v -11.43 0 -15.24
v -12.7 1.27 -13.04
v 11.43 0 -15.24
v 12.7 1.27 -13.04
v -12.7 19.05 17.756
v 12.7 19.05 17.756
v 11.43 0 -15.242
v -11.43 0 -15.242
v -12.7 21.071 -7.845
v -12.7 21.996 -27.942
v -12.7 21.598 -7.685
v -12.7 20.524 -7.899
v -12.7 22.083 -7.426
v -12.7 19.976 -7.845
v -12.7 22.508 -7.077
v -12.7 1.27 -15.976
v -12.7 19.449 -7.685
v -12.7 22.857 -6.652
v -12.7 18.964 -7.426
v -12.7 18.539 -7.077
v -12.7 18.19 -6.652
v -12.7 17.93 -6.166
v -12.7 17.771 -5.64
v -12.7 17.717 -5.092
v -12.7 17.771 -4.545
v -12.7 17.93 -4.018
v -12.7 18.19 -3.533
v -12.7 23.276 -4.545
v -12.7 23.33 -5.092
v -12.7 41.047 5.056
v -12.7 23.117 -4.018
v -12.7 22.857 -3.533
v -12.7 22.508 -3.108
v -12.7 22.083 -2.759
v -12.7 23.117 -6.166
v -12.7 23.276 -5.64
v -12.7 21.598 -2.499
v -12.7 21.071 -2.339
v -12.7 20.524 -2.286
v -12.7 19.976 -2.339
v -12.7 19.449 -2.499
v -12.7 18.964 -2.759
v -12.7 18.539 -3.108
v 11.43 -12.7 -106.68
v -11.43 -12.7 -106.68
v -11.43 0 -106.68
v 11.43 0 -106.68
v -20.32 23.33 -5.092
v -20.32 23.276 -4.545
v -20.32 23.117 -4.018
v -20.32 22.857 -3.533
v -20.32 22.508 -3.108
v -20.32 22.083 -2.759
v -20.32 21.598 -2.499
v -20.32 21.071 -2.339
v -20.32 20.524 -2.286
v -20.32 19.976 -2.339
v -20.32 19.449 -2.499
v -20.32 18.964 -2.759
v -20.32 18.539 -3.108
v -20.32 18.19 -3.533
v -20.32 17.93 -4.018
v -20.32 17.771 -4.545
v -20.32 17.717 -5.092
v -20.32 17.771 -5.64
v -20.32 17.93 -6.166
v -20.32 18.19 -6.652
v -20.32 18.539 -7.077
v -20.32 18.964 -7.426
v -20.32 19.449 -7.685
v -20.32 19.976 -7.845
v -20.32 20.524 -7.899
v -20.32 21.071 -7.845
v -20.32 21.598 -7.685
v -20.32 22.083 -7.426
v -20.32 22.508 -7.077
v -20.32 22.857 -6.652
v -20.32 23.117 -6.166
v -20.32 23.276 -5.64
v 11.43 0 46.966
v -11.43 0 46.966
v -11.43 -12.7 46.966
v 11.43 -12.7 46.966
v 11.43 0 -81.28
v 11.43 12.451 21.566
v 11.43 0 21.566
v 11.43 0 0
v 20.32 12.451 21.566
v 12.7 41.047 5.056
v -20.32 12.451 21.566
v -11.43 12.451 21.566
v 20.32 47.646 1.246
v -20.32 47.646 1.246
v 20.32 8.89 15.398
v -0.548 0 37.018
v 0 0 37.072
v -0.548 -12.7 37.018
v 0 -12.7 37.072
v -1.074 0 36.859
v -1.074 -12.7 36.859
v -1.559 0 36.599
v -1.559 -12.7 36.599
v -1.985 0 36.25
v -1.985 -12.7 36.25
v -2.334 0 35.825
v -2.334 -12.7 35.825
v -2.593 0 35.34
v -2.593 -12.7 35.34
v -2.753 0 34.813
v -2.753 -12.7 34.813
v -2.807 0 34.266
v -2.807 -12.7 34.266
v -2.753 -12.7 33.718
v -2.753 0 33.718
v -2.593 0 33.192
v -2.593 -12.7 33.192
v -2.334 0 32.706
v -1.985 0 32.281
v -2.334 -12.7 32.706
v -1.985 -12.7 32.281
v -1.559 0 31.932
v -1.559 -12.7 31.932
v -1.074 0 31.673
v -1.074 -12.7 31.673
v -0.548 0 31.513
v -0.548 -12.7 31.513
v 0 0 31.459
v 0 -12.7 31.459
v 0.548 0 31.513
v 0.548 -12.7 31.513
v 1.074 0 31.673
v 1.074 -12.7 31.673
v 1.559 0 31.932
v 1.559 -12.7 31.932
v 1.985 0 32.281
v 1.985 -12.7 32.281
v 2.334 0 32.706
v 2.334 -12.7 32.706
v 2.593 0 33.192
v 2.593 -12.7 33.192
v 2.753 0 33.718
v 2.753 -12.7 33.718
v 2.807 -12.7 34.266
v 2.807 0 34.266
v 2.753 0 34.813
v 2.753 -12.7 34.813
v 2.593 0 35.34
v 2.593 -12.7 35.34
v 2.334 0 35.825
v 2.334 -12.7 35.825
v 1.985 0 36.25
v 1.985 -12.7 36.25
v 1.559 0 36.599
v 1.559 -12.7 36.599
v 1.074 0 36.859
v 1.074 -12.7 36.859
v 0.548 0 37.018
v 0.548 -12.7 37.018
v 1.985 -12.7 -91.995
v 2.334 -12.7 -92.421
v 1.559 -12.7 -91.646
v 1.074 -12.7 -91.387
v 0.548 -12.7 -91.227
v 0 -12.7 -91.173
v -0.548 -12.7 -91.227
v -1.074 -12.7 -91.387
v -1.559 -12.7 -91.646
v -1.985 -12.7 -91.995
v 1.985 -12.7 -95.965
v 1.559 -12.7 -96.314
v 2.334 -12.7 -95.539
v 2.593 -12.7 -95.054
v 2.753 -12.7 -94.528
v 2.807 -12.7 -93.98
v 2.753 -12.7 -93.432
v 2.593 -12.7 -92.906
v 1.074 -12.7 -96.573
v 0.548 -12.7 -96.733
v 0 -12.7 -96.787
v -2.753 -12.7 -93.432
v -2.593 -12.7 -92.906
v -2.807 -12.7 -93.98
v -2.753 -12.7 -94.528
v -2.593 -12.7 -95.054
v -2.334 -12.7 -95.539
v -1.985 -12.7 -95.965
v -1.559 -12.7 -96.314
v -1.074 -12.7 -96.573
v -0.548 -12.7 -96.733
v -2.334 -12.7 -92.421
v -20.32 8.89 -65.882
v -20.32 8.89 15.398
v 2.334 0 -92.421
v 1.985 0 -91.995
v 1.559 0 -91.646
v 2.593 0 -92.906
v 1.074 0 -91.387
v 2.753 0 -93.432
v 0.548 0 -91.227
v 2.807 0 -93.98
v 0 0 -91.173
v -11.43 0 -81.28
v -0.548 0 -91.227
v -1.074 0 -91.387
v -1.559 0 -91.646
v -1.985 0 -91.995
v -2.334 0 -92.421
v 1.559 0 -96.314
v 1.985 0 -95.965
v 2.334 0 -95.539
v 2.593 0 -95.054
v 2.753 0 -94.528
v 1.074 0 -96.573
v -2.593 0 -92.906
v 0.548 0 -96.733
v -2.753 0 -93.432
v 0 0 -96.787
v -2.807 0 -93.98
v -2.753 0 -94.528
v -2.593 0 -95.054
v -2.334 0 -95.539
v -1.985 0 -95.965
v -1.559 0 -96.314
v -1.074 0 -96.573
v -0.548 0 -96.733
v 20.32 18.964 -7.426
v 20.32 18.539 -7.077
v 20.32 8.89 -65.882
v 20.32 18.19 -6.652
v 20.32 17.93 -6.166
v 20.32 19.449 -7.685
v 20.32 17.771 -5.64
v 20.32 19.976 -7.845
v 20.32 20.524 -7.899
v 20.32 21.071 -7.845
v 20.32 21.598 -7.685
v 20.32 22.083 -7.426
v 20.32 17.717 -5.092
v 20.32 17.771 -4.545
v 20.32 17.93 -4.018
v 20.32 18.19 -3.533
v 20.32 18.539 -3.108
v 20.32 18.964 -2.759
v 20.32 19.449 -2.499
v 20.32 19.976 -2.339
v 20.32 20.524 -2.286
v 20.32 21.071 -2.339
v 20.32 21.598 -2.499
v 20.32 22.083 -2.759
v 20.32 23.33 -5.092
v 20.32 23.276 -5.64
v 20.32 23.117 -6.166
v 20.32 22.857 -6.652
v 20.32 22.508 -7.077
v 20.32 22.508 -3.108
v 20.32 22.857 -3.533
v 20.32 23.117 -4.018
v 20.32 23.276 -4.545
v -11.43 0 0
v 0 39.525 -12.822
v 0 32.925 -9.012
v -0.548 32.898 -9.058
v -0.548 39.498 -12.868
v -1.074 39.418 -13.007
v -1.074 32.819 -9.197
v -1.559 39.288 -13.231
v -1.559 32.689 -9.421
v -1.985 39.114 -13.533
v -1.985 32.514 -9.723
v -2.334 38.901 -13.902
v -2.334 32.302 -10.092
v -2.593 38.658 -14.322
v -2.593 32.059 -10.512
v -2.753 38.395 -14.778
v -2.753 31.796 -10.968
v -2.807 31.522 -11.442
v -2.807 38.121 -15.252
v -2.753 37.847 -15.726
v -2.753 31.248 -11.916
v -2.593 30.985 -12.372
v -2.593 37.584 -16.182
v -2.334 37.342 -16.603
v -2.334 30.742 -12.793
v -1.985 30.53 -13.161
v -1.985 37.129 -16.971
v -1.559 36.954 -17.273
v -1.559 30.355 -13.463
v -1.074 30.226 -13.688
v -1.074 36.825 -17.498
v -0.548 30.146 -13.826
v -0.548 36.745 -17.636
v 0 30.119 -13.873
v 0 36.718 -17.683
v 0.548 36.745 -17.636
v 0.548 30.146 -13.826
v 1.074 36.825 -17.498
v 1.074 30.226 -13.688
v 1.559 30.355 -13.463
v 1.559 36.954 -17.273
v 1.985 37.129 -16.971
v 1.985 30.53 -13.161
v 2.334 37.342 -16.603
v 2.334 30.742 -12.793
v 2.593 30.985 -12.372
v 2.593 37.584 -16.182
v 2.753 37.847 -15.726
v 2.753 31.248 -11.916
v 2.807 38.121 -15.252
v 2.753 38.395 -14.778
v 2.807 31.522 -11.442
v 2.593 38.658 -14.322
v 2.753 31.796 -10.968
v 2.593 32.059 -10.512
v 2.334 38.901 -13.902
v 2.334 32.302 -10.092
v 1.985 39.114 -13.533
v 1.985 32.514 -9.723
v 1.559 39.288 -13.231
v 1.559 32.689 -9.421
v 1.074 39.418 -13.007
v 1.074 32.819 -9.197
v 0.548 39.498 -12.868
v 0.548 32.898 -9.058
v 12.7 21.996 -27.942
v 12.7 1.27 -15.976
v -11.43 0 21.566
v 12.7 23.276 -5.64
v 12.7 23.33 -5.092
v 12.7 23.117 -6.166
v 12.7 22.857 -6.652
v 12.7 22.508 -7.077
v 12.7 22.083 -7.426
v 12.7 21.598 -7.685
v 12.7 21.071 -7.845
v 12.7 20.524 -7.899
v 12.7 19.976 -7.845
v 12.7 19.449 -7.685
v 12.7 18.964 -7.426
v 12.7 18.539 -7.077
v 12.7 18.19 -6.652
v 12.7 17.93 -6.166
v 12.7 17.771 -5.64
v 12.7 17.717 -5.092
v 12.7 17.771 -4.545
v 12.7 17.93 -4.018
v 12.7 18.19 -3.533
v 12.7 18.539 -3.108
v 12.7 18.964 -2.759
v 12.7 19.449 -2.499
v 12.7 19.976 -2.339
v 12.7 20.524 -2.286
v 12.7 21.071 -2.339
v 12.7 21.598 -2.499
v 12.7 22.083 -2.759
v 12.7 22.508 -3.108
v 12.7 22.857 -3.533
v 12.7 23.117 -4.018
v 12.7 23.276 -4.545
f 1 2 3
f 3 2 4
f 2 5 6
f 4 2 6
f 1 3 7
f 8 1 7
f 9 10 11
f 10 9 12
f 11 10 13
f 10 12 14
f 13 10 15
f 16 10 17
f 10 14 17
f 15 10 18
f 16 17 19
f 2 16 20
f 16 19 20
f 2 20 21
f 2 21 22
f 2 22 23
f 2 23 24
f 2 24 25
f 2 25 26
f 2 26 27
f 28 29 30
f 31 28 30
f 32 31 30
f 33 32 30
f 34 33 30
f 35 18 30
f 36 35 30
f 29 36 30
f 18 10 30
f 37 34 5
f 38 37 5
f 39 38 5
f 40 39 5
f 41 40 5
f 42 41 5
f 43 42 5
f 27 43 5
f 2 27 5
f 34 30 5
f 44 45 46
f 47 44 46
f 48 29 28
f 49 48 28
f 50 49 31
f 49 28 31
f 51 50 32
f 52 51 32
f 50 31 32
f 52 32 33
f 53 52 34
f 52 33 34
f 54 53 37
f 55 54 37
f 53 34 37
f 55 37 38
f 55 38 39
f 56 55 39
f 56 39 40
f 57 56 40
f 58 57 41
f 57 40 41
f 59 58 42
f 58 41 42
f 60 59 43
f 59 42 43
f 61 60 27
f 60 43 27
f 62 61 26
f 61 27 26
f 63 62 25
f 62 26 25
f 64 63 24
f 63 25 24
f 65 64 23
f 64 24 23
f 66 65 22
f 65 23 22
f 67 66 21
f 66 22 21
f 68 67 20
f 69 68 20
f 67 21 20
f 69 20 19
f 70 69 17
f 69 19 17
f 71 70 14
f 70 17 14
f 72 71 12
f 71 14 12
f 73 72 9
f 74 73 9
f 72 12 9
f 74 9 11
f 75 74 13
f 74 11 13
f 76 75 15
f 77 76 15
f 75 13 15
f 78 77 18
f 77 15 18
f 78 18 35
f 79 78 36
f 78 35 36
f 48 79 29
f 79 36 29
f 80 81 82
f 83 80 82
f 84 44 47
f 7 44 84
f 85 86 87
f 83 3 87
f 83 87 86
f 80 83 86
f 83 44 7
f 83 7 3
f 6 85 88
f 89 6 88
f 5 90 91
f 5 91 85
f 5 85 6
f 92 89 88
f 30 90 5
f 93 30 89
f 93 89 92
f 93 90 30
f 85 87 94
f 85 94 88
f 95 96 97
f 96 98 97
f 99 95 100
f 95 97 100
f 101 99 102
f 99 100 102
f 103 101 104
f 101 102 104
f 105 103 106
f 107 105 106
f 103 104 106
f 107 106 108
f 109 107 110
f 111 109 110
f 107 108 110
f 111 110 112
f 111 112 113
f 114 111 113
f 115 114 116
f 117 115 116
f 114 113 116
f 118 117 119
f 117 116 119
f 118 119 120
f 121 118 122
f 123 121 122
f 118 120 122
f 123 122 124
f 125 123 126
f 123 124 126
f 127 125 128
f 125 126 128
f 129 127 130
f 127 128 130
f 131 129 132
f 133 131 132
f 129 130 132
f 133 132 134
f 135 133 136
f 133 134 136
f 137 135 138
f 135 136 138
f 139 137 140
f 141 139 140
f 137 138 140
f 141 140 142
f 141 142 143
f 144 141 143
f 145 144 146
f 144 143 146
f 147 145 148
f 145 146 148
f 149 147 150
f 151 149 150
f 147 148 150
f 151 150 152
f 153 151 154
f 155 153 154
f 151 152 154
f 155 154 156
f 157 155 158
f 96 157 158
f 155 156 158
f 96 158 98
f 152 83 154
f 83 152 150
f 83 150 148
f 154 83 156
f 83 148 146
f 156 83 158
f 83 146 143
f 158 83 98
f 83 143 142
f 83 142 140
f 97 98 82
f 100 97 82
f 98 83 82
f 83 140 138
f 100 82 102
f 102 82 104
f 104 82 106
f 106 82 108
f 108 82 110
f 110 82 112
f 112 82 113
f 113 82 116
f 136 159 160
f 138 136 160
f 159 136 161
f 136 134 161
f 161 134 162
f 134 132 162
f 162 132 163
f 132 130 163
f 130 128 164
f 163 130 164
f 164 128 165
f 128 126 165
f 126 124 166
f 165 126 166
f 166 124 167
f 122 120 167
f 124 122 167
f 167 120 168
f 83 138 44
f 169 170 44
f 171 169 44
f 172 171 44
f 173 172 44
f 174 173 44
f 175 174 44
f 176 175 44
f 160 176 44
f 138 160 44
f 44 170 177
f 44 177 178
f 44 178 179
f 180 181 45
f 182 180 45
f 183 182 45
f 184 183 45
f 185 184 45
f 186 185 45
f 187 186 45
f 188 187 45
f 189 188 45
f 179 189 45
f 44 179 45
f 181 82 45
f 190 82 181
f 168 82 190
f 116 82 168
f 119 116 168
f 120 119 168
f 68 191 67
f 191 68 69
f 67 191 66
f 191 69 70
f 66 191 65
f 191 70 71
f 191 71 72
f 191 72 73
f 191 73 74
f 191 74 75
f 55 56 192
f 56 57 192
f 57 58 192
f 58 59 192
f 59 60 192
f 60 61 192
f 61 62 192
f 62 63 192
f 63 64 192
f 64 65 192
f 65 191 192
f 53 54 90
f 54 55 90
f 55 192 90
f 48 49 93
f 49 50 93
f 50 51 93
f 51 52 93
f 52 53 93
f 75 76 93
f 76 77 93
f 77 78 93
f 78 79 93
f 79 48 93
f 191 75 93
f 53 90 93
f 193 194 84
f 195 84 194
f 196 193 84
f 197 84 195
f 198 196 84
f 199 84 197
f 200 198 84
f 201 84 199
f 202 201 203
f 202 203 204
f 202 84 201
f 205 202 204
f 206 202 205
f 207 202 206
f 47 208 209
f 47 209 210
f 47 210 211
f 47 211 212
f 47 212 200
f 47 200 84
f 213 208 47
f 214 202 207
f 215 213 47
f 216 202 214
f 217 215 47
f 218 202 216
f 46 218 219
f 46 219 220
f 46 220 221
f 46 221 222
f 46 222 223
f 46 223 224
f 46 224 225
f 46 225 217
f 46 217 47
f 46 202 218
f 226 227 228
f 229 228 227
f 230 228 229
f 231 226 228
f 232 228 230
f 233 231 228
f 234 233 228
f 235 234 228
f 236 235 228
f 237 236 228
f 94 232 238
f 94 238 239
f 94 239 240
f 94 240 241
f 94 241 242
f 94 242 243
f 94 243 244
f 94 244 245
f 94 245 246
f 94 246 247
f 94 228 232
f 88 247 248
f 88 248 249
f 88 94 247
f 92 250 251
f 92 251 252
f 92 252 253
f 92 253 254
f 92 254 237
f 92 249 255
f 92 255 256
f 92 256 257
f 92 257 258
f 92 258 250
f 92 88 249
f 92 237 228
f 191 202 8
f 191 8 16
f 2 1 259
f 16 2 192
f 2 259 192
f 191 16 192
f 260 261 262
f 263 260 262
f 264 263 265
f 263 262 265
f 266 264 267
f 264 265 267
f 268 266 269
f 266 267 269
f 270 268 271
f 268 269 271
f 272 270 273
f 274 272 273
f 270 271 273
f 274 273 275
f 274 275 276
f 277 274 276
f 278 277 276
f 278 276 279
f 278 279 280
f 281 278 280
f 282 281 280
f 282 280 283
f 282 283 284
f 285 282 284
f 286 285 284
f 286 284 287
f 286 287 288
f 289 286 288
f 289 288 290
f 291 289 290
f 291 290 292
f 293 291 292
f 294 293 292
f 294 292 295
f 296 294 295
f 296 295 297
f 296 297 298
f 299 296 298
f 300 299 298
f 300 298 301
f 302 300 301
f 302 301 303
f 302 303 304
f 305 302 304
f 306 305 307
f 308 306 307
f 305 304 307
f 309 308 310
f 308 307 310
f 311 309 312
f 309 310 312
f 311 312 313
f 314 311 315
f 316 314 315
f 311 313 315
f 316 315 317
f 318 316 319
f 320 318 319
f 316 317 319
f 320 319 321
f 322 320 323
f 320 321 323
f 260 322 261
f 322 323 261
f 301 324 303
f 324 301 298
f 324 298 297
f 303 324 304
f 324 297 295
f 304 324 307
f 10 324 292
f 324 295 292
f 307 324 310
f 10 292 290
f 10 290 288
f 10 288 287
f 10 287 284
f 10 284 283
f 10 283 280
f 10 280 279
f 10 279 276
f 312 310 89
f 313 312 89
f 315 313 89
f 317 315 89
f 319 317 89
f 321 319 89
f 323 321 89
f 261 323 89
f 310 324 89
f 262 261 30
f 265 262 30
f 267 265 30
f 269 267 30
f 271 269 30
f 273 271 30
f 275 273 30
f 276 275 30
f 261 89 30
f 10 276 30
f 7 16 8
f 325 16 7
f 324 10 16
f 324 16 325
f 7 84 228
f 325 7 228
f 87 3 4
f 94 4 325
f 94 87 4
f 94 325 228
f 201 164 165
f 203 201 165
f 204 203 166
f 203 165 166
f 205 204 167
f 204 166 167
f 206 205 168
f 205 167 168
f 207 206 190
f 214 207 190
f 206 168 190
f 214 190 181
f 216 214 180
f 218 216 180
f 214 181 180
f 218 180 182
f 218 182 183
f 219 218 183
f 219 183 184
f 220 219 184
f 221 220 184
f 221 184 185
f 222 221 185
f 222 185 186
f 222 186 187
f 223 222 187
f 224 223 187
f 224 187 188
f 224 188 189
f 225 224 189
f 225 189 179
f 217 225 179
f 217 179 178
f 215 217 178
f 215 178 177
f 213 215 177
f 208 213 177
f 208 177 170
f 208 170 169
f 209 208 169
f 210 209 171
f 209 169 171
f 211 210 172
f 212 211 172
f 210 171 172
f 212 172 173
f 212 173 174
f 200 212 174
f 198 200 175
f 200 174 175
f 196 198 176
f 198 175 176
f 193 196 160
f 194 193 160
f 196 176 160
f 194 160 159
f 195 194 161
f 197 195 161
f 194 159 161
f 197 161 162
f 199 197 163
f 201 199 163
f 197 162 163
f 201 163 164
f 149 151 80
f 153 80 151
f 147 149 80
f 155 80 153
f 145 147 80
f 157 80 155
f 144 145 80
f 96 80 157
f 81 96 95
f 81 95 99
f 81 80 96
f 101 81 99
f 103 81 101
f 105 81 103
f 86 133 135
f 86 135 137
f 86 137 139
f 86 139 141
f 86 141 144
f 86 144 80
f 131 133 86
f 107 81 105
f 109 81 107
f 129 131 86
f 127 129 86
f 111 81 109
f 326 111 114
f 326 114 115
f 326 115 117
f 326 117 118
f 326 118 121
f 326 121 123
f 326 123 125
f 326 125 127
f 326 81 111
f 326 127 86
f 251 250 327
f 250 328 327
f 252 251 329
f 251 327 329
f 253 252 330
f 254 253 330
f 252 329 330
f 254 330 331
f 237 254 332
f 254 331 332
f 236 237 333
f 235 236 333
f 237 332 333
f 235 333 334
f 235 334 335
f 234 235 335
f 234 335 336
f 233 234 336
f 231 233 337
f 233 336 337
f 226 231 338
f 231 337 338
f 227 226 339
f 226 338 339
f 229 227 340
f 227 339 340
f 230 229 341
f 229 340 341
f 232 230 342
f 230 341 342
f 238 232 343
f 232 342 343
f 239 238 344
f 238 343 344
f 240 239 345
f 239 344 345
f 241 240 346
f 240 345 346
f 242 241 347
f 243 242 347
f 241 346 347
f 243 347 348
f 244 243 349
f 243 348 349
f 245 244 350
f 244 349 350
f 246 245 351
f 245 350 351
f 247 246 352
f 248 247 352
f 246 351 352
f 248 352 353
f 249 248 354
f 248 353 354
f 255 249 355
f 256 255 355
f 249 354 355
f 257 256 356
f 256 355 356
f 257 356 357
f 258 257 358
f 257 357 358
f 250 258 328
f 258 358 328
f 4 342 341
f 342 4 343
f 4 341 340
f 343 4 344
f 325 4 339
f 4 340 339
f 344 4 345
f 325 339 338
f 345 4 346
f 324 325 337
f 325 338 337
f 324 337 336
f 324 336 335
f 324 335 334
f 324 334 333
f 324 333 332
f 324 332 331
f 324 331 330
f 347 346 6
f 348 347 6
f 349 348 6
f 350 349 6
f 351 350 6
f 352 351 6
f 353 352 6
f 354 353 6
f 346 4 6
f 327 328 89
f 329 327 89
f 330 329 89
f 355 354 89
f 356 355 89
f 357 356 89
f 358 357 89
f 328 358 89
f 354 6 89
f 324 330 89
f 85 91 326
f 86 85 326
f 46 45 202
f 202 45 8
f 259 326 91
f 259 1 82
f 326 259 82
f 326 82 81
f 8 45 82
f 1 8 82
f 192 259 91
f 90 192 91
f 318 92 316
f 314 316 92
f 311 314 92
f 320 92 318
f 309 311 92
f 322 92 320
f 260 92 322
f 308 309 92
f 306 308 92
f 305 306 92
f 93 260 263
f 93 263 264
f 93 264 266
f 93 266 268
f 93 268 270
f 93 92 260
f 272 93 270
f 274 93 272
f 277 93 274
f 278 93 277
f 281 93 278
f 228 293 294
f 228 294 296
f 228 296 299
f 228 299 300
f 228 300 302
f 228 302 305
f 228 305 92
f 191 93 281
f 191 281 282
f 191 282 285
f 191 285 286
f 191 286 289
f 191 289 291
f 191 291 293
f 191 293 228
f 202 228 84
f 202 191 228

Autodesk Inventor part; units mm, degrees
ref_plane "YZ Plane" through (0, 0, 0) normal (1, 0, 0) x (0, 1, 0)
ref_plane "XZ Plane" through (0, 0, 0) normal (0, 1, 0) x (-1, 0, 0)
ref_plane "XY Plane" through (0, 0, 0) normal (0, 0, 1) x (1, 0, 0)
sketch "Sketch1" plane through (0, 0, 0) normal (1, 0, 0) x (0, 1, 0)
  line L0 (0, 0) -> (12.4509, 21.5656)
  line L1 (12.4509, 21.5656) -> (47.6462, 1.2456)
  line L2 (0, -101.8491) -> (0, 42.1347) projected
  line L3 (47.6462, 1.2456) -> (0, -81.28)
  line L4 (0, 0) -> (0, -81.28)
  line L5 (19.05, 17.7556) -> (0, -15.24) construction
  dimension "d0" = 40.64
  dimension "d1" = 30
  dimension "d5" = 7.62
  dimension "d6" = 38.1
extrude "Extrusion1" add sketch "Sketch1" along normal mid plane 40.64
sketch "Sketch2" plane through (-20.32, 12.4509, 21.5656) normal (0, 0.5, 0.8660254) x (1, 0, 0)
  line L0 (0, 0) -> (40.64, 0) construction
  line L1 (40.64, 0) -> (40.64, 40.64) construction
  line L2 (0, 0) -> (40.64, 40.64) construction
  line L3 (40.64, 40.64) -> (0, 40.64) construction
  line L4 (0, 40.64) -> (40.64, 0) construction
  line L5 (7.62, 7.62) -> (33.02, 7.62)
  line L6 (33.02, 7.62) -> (33.02, 33.02)
  line L7 (33.02, 33.02) -> (7.62, 33.02)
  line L8 (7.62, 33.02) -> (7.62, 7.62)
  line L9 (7.62, 7.62) -> (33.02, 33.02) construction
  line L10 (33.02, 7.62) -> (7.62, 33.02) construction
  point P0 (20.32, 0)
  point P1 (20.32, 20.32)
  dimension "d7" = 25.4
extrude "Extrusion2" cut sketch "Sketch2" against normal blind 38.1
sketch "Sketch3" plane through (0, 0, 0) normal (1, 0, 0) x (0, 1, 0)
  line L0 (12.4509, 21.5656) -> (0, 0) projected
  line L1 (0, 0) -> (0, -81.28) projected
  line L2 (0, -81.28) -> (47.6462, 1.2456) projected
  line L3 (21.997, -27.94) -> (0, -15.24) projected
  line L4 (19.05, 17.7556) -> (0, -15.24) projected
  line L5 (0, 0) -> (0, -81.28)
  line L6 (12.4509, 21.5656) -> (-1.0999, 21.5656) construction
  line L7 (0, 0) -> (12.4509, 21.5656) projected
  line L8 (0, 0) -> (0, 46.9656)
  line L9 (47.6462, 1.2456) -> (0, -81.28) projected
  line L10 (0, -81.28) -> (0, -106.68)
  line L11 (0, -137.7901) -> (0, 79.9807) projected
  line L12 (0, 46.9656) -> (-12.7, 46.9656)
  line L13 (-12.7, 46.9656) -> (-12.7, -106.68)
  line L14 (-12.7, -106.68) -> (0, -106.68)
  point P0 (1.0999, -13.335)
  dimension "d10" = 25.4
  dimension "d11" = 25.4
  dimension "d12" = 12.7
  dimension "supportBaseLength" = 153.6456
extrude "Extrusion3" add sketch "Sketch3" along normal mid plane 22.86
sketch "Sketch5" plane through (0, 0, 0) normal (1, 0, 0) x (0, 1, 0)
  line L0 (0, 0) -> (12.4509, 21.5656) projected
  line L1 (0, 46.9656) -> (0, 0) projected
  line L2 (12.4509, 21.5656) -> (47.6462, 1.2456) projected
  line L3 (12.4509, 21.5656) -> (0, 21.5656)
  line L4 (0, 0) -> (12.4509, 21.5656)
extrude "Extrusion5" add sketch "Sketch5" along normal mid plane 22.86
sketch "Sketch4" plane through (0, 0, 0) normal (0, 0, 1) x (1, 0, 0)
  line L0 (20.32, 47.6462) -> (-20.32, 47.6462) projected
  line L1 (20.32, 0) -> (20.32, 47.6462) projected
  line L2 (20.32, 0) -> (11.43, 0) projected
  line L3 (11.43, 0) -> (-11.43, 0) projected
  line L4 (-11.43, 0) -> (-20.32, 0) projected
  line L5 (-20.32, 47.6462) -> (-20.32, 0) projected
  line L6 (-11.43, 0) -> (-11.43, -12.7) projected
  line L7 (11.43, -12.7) -> (-11.43, -12.7) projected
  line L8 (11.43, -12.7) -> (11.43, 0) projected
  line L9 (-11.43, 0) -> (-20.32, 8.89)
  line L10 (-20.32, 47.6462) -> (-20.32, 0) projected
  line L11 (-20.32, 8.89) -> (-20.32, 0)
  line L12 (0, 0) -> (0, 47.6462) construction
  line L13 (11.43, 0) -> (20.32, 0)
  line L14 (11.43, 0) -> (20.32, 8.89)
  line L15 (20.32, 8.89) -> (20.32, 0)
  dimension "d15" = 45
extrude "Extrusion4" cut sketch "Sketch4" against normal up to surface (153.6456 mm away) from surface at 46.9656 contours L1 L2 L14 | L9 L4 L5
sketch "Sketch6" plane through (-11.43, 0, 46.9656) normal (0, 1, 0) x (1, 0, 0)
  line L0 (22.86, 153.6456) -> (0, 153.6456) construction
  line L1 (11.43, 153.6456) -> (11.43, 0) construction
  line L2 (22.86, 0) -> (0, 0) construction
  point P0 (11.43, 46.9656)
  point P1 (11.43, 140.9456)
  point P2 (11.43, 12.7)
  dimension "d21" = 12.7
  dimension "d22" = 12.7
hole "Hole1" at (0, 0, -93.98) at (0, 0, 34.2656) direction (0, -1, 0) diameter 5.6134 end through all clearance for "Flat Head Machine Screw (82)" size "#10" standard "Ansi Unified Screw Threads"
sketch "Sketch9" plane through (0, 0, 0) normal (1, 0, 0) x (0, 1, 0)
  line L0 (1.27, -13.0403) -> (1.27, -15.9732) projected
  line L1 (1.27, -15.9732) -> (21.997, -27.94) projected
  line L2 (41.047, 5.0556) -> (21.997, -27.94) projected
  line L3 (19.05, 17.7556) -> (41.047, 5.0556) projected
  line L4 (19.05, 17.7556) -> (1.27, -13.0403) projected
  line L5 (30.0485, 11.4056) -> (10.9985, -21.59) construction
  line L6 (1.27, -15.9732) -> (21.997, -27.94) construction
  circle A0 centre (20.5235, -5.0922) radius 2.8067
  point P0 (0, 0)
  dimension "d30" = 5.6134
extrude "Extrusion6" cut sketch "Sketch9" along normal through all both and the other way through all contours A0
sketch "Sketch10" plane through (-20.32, 47.6462, 1.2456) normal (0, 0.8660254, -0.5) x (1, 0, 0)
  line L0 (7.62, 0) -> (33.02, 0) construction
  line L1 (20.32, 0) -> (20.32, 77.7875) construction
  point P0 (20.32, 24.9018)
  point P1 (20.32, 19.05)
  dimension "d33" = 19.05
hole "Hole2" at (0, 38.1212, -15.2522) direction (0, -0.8660254, 0.5) diameter 5.6134 depth 7.62 clearance for "Flat Head Machine Screw (82)" size "#10" standard "Ansi Unified Screw Threads"
equation "\"d0\" = widthToSupportExtrusion"
equation "\"d1\" = attachementAngle"
equation "\"d6\" = insertDepth"
equation "\"d2\" = widthToSupportExtrusion"
equation "\"d7\" = extrusionSize"
equation "\"d8\" = insertDepth"
equation "\"d12\" = supportBaseDepth"
equation "\"d13\" = supportBaseWidth"
equation "\"attachementAngle\" = 30deg"
equation "\"extrusionSize\" = 25.4"
equation "\"wallThickness\" = 6.35"
equation "\"slipClearance\" = 1.27"
equation "\"insertForExtrusion\" = extrusionSize + 2 * slipClearance"
equation "\"widthToSupportExtrusion\" = insertForExtrusion + 2 * wallThickness"
equation "\"insertDepth\" = 38.1"
equation "\"supportBaseWidth\" = 22.86"
equation "\"supportBaseDepth\" = 12.7"
properties part number "30DegreeAttachementV02"
